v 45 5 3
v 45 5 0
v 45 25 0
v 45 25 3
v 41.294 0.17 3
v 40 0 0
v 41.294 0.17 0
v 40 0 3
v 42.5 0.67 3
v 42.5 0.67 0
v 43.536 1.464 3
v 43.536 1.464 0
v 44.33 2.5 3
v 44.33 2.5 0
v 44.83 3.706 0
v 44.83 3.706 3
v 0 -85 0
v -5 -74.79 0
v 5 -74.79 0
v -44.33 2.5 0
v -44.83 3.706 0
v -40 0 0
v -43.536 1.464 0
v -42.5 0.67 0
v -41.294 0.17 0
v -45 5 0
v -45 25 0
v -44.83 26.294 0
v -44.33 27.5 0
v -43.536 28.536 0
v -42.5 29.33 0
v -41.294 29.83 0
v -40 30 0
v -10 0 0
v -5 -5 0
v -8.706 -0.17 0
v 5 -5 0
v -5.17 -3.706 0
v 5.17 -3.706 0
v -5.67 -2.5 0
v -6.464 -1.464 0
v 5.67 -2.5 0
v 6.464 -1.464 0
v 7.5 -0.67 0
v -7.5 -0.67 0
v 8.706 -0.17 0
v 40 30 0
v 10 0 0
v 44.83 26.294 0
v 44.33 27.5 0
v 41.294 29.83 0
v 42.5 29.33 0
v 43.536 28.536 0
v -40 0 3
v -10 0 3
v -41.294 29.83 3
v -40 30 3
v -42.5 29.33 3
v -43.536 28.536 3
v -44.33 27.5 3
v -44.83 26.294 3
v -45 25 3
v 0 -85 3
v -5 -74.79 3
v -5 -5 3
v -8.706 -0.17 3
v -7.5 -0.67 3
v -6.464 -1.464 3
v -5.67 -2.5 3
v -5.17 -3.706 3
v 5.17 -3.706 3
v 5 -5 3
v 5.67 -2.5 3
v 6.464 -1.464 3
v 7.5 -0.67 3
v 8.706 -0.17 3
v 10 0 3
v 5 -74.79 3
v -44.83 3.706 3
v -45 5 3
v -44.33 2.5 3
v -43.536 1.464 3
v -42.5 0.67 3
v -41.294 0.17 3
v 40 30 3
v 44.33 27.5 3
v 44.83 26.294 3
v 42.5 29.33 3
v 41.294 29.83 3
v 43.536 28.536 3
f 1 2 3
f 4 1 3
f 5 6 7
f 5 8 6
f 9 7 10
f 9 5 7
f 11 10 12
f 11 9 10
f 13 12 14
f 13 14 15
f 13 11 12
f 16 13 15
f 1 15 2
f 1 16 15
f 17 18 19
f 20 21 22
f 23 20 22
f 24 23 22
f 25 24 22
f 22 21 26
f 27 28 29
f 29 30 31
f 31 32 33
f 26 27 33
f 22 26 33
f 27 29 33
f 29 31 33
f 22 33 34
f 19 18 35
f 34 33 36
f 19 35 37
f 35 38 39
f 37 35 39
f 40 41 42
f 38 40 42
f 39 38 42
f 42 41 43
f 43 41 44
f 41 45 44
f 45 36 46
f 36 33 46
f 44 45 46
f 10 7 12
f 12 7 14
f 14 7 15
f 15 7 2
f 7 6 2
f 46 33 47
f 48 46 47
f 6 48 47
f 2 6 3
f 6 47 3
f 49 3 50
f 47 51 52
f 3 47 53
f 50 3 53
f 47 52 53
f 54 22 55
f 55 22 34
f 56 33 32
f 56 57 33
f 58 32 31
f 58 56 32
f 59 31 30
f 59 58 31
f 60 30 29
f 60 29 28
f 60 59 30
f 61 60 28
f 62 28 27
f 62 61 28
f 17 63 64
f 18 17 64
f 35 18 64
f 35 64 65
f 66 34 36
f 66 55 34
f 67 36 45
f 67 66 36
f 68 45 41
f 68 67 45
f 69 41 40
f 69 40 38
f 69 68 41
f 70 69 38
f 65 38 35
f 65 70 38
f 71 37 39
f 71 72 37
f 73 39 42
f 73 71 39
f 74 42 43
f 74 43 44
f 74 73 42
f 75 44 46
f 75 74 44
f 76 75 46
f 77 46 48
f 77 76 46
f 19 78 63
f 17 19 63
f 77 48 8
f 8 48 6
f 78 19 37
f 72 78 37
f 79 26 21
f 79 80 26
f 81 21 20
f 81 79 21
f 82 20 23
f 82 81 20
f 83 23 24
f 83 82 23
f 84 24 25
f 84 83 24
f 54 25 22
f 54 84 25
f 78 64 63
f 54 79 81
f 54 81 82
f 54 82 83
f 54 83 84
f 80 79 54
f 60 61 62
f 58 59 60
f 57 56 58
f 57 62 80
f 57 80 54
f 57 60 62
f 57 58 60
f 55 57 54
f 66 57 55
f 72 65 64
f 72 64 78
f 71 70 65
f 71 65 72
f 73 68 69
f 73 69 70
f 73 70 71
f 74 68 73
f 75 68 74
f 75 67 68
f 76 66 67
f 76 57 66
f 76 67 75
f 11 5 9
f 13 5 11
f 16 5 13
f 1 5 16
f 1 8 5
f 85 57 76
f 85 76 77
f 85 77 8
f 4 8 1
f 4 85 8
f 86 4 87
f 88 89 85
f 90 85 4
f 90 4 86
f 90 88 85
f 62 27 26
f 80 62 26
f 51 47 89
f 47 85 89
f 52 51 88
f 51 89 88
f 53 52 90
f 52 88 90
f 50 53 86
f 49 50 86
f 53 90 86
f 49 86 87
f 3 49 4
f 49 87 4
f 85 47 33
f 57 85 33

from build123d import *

# Parameters (mm, degrees)
F0_W     = 10
F0_H     = 85
F1_DEPTH = 3
F2_R     = 5
F4_DEPTH = 25


# Not quite as in the source:
# - a feature names something its author has since deleted; it is built from what else it names


with BuildPart() as f1:
    # F0 (on Top) → F1 (new body)
    with BuildSketch(Plane.XY):
        Polygon((45, 30), (-45, 30), (-45, 0), (-5, 0), (5, 0), (45, 0), align=None)
        with Locations((0, -42.5)):
            Rectangle(F0_W, F0_H)
    extrude(amount=F1_DEPTH)

    # F2
    f2_edges = [f1.edges().sort_by_distance(p)[0] for p in [
        (-45, 0, 1.5),
        (-45, 30, 1.5),
        (45, 0, 1.5),
        (45, 30, 1.5),
        (5, 0, 1.5),
        (-5, 0, 1.5),
    ]]
    fillet(f2_edges, radius=F2_R)

    # F3 (on face) → F4 (cut)
    with BuildSketch(Plane.XY.offset(3)):
        Polygon((-5, -85), (0, -85), (-5, -74.790418148), align=None)
        Polygon((5, -74.790418148), (0, -85), (5, -85), align=None)
    extrude(amount=-F4_DEPTH, mode=Mode.SUBTRACT)


solid = f1.part
